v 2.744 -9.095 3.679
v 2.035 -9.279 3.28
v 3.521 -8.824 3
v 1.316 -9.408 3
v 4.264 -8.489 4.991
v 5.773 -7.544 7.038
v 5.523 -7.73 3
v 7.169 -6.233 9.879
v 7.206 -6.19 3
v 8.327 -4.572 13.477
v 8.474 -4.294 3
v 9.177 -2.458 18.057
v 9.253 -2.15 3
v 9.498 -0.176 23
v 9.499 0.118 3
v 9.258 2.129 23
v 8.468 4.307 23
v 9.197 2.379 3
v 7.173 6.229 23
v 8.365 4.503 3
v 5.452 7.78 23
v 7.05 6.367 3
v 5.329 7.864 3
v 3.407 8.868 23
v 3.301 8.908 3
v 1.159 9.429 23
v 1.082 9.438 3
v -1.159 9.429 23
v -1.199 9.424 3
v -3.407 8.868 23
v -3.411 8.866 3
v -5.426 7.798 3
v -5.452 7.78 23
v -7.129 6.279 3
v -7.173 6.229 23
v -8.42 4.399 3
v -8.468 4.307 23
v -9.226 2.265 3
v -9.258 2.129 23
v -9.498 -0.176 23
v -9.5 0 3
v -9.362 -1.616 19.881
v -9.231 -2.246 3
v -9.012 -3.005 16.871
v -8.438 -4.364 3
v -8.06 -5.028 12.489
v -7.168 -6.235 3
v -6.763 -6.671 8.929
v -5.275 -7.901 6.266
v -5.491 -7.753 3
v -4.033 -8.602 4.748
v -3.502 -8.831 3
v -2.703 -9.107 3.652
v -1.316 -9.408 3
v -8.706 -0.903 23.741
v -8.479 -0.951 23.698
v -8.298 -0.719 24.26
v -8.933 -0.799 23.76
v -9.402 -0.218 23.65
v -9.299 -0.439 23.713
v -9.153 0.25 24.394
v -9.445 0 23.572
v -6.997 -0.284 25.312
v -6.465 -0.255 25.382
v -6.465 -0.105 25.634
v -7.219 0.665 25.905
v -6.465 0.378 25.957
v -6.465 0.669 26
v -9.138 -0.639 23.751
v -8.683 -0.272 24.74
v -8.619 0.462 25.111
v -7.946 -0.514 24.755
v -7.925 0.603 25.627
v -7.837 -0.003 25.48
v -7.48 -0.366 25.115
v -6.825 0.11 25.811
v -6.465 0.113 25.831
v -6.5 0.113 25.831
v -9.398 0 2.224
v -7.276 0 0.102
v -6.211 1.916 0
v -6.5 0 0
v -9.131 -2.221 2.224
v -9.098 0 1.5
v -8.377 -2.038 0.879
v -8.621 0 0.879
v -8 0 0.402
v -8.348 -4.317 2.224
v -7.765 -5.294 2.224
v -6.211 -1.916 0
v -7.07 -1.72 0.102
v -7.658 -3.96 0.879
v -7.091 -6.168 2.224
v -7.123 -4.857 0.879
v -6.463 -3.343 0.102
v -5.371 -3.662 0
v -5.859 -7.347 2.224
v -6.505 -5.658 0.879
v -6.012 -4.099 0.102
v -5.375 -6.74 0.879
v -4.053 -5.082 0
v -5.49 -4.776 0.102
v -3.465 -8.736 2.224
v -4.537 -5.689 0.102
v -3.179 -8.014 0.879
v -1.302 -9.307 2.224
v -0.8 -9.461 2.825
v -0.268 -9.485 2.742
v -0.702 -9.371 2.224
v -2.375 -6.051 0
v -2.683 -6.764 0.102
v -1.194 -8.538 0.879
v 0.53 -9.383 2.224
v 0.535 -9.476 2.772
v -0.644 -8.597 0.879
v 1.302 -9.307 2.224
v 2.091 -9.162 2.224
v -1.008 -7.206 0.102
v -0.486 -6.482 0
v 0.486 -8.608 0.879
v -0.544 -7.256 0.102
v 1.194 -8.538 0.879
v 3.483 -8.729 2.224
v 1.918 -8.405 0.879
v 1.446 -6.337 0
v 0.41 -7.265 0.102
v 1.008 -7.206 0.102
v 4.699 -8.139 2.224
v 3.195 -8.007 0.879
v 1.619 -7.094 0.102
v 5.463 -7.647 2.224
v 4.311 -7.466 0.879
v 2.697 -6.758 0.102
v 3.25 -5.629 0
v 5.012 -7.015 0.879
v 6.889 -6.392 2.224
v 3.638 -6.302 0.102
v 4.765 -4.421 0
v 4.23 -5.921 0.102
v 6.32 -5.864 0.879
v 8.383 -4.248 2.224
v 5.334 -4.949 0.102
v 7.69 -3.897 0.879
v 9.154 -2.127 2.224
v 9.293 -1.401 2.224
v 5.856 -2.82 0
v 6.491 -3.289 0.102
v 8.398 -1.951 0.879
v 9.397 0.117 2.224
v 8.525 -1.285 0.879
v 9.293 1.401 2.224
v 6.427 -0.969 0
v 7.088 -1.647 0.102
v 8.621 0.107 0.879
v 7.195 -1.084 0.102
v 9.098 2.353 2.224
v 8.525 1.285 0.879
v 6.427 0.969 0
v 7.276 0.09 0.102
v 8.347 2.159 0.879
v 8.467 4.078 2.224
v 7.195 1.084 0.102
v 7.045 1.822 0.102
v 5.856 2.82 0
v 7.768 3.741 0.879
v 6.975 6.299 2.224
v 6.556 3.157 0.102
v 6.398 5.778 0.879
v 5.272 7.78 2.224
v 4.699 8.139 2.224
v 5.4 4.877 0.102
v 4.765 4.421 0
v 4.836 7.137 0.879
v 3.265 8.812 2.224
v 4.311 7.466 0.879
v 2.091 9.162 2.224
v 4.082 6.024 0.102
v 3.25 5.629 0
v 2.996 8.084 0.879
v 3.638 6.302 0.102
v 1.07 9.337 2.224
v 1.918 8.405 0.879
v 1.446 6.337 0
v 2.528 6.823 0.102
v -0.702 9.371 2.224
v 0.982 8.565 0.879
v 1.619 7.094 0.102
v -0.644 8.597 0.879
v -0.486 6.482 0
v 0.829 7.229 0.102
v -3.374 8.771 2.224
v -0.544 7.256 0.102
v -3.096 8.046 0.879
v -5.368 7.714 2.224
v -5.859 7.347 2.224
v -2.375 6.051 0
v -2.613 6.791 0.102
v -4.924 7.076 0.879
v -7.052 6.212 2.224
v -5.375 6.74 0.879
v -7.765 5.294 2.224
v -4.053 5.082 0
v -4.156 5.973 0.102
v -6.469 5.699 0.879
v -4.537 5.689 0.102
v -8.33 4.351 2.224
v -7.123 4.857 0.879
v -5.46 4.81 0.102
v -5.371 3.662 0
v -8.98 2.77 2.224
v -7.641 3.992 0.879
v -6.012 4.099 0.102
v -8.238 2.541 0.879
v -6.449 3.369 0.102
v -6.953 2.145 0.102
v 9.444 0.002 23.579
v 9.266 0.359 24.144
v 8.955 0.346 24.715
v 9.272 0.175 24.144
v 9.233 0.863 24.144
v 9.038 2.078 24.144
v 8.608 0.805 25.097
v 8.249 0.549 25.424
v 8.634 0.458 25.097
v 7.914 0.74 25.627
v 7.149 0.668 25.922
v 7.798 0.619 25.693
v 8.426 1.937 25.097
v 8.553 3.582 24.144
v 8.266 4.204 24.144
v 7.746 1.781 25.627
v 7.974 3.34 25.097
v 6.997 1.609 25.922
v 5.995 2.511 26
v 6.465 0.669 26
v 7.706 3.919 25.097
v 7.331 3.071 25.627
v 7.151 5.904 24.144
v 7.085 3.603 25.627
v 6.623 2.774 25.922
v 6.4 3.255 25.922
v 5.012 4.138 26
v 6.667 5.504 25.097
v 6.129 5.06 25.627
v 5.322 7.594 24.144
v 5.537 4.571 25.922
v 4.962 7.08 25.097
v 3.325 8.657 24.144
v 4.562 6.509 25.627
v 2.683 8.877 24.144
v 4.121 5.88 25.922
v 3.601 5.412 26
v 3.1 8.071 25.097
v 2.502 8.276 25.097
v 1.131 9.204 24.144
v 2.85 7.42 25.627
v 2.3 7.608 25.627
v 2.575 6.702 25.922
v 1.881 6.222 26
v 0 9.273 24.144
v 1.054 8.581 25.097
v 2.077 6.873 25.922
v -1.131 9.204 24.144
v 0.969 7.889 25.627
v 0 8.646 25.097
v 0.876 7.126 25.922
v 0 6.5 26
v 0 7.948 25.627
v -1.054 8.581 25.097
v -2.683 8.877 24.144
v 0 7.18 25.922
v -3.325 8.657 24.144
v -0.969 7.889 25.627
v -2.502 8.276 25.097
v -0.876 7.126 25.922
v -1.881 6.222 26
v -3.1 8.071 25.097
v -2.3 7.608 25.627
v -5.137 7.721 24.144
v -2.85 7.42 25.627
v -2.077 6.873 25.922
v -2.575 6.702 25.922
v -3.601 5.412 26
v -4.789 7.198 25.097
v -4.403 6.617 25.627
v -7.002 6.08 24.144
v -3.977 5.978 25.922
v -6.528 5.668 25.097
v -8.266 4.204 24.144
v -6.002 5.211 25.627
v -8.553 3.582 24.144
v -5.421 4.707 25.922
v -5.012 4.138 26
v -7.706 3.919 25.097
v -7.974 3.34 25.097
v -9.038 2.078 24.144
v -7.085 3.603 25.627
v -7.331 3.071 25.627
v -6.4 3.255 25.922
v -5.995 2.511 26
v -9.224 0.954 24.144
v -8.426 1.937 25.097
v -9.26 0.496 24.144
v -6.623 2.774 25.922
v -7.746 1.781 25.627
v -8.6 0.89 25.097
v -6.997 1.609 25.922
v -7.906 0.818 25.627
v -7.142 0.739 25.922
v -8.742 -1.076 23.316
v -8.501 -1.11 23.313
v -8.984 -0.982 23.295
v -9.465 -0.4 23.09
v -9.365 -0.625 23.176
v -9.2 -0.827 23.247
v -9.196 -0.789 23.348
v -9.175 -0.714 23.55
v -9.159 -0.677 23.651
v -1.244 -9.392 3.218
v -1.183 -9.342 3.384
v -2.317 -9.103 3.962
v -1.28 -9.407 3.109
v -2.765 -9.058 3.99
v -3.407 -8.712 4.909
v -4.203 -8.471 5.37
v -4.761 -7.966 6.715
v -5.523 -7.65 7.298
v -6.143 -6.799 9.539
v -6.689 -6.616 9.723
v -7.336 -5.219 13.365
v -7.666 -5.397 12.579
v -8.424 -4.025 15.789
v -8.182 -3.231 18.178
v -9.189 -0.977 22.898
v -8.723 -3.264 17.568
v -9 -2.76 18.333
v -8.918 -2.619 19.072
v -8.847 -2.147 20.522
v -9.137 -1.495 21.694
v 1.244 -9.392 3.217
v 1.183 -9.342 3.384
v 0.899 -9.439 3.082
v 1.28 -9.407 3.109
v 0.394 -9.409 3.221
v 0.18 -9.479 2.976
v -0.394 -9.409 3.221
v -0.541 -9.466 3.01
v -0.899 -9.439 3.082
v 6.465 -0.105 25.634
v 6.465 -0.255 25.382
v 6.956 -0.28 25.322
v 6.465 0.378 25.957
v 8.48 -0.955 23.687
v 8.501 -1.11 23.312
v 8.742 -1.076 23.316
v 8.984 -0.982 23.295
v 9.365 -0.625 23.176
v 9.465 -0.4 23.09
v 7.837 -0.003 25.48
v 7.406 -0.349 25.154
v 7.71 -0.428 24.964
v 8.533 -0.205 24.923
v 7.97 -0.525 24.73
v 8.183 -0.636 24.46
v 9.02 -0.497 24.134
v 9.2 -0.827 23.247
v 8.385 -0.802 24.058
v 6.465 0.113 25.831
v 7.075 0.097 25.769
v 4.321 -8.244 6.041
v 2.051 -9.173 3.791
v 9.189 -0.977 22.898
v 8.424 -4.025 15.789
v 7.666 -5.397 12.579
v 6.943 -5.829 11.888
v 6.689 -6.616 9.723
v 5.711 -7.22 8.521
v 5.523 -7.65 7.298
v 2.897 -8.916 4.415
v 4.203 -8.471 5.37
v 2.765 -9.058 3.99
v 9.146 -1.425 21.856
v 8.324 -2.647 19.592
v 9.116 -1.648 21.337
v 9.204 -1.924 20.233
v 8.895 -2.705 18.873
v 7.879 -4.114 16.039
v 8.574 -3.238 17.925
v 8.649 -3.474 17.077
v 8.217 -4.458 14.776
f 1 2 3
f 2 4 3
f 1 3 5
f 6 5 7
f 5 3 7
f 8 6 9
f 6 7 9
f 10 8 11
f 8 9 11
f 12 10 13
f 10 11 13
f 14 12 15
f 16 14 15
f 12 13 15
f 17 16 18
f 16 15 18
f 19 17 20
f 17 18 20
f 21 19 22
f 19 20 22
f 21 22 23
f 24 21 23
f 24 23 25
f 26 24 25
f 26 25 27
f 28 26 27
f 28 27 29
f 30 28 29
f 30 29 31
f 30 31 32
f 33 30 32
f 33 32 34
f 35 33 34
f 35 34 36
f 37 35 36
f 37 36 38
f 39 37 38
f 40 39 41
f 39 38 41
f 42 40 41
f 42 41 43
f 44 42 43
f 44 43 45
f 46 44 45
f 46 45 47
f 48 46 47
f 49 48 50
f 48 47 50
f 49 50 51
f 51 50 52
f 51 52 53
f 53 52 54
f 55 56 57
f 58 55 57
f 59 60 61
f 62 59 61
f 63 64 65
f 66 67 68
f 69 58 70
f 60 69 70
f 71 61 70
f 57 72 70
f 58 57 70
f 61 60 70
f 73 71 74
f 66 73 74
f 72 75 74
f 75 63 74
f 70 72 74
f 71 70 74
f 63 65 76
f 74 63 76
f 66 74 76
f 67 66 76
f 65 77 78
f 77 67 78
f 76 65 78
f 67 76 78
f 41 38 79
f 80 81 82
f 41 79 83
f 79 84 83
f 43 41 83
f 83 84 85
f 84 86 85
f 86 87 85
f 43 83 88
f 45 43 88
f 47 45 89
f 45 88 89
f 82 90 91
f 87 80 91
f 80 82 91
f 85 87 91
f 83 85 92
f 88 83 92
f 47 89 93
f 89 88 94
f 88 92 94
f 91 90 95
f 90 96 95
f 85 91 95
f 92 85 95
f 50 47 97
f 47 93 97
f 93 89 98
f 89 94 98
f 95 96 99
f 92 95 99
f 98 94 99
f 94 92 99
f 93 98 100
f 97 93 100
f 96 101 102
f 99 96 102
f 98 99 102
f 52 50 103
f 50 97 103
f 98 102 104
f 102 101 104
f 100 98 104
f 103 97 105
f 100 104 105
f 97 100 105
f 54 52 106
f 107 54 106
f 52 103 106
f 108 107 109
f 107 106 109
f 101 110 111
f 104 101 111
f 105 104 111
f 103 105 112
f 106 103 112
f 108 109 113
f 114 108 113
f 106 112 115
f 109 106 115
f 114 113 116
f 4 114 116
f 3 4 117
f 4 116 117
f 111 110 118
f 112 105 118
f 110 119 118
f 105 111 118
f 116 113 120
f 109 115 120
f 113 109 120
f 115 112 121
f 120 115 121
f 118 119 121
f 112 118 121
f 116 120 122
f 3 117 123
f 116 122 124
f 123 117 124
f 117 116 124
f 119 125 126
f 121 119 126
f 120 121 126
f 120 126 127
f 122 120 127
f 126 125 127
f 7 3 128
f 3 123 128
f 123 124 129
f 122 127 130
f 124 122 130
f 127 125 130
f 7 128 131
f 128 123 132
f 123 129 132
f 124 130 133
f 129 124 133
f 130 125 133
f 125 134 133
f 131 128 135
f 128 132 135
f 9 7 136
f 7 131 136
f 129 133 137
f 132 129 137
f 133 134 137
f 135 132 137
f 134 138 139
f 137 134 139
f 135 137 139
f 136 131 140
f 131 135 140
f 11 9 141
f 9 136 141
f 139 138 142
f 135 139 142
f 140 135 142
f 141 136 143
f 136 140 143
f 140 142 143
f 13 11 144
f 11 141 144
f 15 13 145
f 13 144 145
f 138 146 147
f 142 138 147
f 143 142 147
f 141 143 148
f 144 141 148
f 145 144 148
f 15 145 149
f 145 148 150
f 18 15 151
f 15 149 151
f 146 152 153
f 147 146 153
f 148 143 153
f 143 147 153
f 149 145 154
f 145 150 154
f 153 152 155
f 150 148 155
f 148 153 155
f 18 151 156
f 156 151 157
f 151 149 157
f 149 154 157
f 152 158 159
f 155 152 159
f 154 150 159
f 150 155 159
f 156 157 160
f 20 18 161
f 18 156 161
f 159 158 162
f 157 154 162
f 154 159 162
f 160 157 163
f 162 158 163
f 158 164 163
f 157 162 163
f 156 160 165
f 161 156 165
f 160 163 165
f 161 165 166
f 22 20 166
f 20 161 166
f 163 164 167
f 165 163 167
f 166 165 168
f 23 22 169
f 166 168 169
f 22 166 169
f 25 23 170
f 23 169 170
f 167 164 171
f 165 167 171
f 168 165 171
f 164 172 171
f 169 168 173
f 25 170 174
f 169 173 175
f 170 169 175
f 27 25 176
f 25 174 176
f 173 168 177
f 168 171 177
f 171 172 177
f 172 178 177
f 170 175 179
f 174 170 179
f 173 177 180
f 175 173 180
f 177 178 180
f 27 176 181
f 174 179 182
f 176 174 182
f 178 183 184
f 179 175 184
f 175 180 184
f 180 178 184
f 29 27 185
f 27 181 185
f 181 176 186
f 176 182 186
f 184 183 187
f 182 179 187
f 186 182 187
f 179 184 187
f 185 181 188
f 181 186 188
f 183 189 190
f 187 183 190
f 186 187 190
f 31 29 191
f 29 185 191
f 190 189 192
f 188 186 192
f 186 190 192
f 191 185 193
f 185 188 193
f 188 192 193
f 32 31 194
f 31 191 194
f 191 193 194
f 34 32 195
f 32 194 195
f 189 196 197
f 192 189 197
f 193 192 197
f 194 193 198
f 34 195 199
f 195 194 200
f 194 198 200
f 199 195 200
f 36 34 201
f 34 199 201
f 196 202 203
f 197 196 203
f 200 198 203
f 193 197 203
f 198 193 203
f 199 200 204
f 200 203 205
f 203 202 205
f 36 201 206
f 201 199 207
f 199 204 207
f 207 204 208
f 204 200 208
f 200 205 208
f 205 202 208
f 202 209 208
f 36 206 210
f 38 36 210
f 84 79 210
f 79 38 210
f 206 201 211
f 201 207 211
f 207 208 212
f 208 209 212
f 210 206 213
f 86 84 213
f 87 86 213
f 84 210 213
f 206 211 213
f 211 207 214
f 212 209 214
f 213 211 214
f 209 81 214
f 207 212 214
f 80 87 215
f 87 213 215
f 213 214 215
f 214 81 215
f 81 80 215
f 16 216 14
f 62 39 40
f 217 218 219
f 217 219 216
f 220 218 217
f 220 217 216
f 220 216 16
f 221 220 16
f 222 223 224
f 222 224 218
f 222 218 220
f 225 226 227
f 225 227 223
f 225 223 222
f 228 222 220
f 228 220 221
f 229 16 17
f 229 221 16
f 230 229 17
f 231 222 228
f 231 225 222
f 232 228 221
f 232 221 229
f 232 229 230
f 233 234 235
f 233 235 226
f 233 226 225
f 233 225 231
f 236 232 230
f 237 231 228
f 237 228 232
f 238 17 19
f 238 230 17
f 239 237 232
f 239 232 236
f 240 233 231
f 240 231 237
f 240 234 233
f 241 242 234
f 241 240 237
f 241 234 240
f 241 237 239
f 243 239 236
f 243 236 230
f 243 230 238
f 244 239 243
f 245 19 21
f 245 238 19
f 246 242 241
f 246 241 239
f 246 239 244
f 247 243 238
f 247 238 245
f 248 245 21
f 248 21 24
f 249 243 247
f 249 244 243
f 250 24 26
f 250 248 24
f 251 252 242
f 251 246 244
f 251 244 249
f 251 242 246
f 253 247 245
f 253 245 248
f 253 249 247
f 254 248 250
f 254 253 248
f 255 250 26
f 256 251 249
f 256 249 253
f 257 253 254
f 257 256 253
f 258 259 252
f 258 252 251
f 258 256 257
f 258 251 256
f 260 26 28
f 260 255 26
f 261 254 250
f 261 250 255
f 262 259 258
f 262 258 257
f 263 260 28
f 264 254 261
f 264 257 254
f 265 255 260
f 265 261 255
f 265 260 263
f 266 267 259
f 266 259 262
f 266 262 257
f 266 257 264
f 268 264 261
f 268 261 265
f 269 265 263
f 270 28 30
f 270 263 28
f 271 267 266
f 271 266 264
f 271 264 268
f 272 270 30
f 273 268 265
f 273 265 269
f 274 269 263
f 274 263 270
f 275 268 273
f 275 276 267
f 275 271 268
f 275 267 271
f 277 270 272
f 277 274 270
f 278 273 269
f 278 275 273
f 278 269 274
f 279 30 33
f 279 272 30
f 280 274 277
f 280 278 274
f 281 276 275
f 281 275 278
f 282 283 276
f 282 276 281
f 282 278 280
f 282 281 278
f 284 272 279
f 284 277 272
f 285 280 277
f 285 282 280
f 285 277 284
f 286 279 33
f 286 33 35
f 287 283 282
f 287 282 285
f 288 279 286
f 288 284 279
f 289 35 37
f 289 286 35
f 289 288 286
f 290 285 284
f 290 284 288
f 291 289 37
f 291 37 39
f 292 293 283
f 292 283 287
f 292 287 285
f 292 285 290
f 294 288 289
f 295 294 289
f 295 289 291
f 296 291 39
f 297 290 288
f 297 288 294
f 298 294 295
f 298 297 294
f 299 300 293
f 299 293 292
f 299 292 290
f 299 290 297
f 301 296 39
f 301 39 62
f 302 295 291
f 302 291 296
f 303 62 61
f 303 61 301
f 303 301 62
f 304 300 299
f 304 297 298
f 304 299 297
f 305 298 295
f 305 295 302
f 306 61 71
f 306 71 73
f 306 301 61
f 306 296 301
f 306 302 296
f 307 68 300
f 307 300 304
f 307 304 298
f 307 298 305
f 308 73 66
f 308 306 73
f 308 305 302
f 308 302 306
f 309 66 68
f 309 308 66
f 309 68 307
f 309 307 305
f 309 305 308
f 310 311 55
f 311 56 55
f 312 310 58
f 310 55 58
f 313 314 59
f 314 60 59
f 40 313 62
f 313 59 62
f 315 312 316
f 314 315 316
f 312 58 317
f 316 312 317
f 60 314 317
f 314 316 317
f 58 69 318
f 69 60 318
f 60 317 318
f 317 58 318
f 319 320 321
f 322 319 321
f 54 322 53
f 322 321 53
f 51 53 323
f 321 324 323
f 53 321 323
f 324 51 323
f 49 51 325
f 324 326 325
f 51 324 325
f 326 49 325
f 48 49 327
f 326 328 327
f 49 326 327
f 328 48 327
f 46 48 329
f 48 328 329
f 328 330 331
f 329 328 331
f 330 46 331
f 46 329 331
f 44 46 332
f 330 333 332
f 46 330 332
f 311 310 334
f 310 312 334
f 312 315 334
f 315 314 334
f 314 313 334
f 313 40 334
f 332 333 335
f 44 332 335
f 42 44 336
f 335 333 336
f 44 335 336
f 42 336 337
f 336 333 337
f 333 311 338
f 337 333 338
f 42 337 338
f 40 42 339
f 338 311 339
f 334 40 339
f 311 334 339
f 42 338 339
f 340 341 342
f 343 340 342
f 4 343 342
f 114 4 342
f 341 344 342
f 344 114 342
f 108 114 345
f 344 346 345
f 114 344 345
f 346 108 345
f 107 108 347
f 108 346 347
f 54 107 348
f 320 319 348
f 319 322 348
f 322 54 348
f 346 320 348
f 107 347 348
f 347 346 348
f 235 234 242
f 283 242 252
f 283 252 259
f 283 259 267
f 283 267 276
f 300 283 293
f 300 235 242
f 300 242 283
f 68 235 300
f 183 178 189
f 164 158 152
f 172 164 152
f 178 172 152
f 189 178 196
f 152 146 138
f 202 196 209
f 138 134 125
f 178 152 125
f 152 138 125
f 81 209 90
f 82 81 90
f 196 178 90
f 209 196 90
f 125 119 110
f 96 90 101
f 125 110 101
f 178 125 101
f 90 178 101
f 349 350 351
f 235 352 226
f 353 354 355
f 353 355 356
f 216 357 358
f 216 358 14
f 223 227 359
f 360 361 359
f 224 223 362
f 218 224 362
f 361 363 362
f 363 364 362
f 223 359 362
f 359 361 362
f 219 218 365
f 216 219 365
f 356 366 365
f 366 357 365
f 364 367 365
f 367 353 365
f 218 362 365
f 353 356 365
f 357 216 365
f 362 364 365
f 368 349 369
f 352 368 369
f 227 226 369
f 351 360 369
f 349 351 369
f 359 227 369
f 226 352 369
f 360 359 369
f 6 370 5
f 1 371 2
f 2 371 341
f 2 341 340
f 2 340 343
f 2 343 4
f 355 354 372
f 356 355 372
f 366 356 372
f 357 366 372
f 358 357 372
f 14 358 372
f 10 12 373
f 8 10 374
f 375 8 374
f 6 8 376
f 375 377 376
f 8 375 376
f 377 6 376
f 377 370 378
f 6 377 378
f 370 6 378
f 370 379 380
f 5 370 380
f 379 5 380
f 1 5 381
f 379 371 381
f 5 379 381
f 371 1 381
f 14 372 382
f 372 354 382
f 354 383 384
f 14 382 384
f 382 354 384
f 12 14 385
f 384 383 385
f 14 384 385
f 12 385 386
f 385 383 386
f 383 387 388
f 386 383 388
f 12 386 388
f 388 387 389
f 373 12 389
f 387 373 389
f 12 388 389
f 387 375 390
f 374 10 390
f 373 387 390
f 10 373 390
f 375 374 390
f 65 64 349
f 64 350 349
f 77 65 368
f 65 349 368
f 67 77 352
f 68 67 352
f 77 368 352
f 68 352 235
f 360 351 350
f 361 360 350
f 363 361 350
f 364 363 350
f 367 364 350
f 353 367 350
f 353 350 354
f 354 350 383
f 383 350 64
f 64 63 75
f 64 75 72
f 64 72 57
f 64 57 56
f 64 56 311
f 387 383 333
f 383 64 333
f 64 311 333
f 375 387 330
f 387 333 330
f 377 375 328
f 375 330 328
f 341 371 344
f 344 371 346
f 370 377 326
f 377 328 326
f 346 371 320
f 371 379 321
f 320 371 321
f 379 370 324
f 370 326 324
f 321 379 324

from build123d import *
from build123d.topology import SkipClean

# Parameters (mm, degrees)
SKETCH2_R               = 9.5
BOSS_EXTRUDE1_DEPTH     = 26
FILLET1_R               = 3
CUT_EXTRUDE1_DEPTH      = 10
CUT_EXTRUDE1_DEPTH_BACK = 10
FILLET2_R               = 1


with BuildPart() as part:
    # Sketch2 → Boss-Extrude1 (new body)
    with BuildSketch(Plane.XY):
        Circle(SKETCH2_R)
    extrude(amount=BOSS_EXTRUDE1_DEPTH)

    # Fillet1
    fillet1_edges = [part.edges().sort_by_distance(p)[0] for p in [
        (-9.5, 0, 26),
        (-9.5, 0, 0),
    ]]
    fillet(fillet1_edges, radius=FILLET1_R)

    # Sketch3 → Cut-Extrude1 (cut, two sides: drawn at the far end of the back side and taken through both)
    with SkipClean():  # the faces are left unmerged after this step: merging them gives an invalid solid
        with BuildSketch(Plane(origin=(0, 0, 0), x_dir=(0, 0, -1), z_dir=(1, 0, 0)).offset(-CUT_EXTRUDE1_DEPTH_BACK)):
            Polygon((-26, 0), (-3, -9.5), (-3, -10.4048104), (-26, -10.4048104), align=None)
        extrude(amount=CUT_EXTRUDE1_DEPTH + CUT_EXTRUDE1_DEPTH_BACK, mode=Mode.SUBTRACT)

    # Fillet2
    fillet2_edges = [part.edges().sort_by_distance(p)[0] for p in [
        (7.397028658, -5.961037413, 11.568014685),
        (8.650304994, -0.378600602, 25.083388017),
        (-7.397028654, -5.961037417, 11.568014675),
        (-8.65030496, -0.378600587, 25.083388053),
        (0, 0, 26),
    ]]
    fillet(fillet2_edges, radius=FILLET2_R)


solid = part.part
